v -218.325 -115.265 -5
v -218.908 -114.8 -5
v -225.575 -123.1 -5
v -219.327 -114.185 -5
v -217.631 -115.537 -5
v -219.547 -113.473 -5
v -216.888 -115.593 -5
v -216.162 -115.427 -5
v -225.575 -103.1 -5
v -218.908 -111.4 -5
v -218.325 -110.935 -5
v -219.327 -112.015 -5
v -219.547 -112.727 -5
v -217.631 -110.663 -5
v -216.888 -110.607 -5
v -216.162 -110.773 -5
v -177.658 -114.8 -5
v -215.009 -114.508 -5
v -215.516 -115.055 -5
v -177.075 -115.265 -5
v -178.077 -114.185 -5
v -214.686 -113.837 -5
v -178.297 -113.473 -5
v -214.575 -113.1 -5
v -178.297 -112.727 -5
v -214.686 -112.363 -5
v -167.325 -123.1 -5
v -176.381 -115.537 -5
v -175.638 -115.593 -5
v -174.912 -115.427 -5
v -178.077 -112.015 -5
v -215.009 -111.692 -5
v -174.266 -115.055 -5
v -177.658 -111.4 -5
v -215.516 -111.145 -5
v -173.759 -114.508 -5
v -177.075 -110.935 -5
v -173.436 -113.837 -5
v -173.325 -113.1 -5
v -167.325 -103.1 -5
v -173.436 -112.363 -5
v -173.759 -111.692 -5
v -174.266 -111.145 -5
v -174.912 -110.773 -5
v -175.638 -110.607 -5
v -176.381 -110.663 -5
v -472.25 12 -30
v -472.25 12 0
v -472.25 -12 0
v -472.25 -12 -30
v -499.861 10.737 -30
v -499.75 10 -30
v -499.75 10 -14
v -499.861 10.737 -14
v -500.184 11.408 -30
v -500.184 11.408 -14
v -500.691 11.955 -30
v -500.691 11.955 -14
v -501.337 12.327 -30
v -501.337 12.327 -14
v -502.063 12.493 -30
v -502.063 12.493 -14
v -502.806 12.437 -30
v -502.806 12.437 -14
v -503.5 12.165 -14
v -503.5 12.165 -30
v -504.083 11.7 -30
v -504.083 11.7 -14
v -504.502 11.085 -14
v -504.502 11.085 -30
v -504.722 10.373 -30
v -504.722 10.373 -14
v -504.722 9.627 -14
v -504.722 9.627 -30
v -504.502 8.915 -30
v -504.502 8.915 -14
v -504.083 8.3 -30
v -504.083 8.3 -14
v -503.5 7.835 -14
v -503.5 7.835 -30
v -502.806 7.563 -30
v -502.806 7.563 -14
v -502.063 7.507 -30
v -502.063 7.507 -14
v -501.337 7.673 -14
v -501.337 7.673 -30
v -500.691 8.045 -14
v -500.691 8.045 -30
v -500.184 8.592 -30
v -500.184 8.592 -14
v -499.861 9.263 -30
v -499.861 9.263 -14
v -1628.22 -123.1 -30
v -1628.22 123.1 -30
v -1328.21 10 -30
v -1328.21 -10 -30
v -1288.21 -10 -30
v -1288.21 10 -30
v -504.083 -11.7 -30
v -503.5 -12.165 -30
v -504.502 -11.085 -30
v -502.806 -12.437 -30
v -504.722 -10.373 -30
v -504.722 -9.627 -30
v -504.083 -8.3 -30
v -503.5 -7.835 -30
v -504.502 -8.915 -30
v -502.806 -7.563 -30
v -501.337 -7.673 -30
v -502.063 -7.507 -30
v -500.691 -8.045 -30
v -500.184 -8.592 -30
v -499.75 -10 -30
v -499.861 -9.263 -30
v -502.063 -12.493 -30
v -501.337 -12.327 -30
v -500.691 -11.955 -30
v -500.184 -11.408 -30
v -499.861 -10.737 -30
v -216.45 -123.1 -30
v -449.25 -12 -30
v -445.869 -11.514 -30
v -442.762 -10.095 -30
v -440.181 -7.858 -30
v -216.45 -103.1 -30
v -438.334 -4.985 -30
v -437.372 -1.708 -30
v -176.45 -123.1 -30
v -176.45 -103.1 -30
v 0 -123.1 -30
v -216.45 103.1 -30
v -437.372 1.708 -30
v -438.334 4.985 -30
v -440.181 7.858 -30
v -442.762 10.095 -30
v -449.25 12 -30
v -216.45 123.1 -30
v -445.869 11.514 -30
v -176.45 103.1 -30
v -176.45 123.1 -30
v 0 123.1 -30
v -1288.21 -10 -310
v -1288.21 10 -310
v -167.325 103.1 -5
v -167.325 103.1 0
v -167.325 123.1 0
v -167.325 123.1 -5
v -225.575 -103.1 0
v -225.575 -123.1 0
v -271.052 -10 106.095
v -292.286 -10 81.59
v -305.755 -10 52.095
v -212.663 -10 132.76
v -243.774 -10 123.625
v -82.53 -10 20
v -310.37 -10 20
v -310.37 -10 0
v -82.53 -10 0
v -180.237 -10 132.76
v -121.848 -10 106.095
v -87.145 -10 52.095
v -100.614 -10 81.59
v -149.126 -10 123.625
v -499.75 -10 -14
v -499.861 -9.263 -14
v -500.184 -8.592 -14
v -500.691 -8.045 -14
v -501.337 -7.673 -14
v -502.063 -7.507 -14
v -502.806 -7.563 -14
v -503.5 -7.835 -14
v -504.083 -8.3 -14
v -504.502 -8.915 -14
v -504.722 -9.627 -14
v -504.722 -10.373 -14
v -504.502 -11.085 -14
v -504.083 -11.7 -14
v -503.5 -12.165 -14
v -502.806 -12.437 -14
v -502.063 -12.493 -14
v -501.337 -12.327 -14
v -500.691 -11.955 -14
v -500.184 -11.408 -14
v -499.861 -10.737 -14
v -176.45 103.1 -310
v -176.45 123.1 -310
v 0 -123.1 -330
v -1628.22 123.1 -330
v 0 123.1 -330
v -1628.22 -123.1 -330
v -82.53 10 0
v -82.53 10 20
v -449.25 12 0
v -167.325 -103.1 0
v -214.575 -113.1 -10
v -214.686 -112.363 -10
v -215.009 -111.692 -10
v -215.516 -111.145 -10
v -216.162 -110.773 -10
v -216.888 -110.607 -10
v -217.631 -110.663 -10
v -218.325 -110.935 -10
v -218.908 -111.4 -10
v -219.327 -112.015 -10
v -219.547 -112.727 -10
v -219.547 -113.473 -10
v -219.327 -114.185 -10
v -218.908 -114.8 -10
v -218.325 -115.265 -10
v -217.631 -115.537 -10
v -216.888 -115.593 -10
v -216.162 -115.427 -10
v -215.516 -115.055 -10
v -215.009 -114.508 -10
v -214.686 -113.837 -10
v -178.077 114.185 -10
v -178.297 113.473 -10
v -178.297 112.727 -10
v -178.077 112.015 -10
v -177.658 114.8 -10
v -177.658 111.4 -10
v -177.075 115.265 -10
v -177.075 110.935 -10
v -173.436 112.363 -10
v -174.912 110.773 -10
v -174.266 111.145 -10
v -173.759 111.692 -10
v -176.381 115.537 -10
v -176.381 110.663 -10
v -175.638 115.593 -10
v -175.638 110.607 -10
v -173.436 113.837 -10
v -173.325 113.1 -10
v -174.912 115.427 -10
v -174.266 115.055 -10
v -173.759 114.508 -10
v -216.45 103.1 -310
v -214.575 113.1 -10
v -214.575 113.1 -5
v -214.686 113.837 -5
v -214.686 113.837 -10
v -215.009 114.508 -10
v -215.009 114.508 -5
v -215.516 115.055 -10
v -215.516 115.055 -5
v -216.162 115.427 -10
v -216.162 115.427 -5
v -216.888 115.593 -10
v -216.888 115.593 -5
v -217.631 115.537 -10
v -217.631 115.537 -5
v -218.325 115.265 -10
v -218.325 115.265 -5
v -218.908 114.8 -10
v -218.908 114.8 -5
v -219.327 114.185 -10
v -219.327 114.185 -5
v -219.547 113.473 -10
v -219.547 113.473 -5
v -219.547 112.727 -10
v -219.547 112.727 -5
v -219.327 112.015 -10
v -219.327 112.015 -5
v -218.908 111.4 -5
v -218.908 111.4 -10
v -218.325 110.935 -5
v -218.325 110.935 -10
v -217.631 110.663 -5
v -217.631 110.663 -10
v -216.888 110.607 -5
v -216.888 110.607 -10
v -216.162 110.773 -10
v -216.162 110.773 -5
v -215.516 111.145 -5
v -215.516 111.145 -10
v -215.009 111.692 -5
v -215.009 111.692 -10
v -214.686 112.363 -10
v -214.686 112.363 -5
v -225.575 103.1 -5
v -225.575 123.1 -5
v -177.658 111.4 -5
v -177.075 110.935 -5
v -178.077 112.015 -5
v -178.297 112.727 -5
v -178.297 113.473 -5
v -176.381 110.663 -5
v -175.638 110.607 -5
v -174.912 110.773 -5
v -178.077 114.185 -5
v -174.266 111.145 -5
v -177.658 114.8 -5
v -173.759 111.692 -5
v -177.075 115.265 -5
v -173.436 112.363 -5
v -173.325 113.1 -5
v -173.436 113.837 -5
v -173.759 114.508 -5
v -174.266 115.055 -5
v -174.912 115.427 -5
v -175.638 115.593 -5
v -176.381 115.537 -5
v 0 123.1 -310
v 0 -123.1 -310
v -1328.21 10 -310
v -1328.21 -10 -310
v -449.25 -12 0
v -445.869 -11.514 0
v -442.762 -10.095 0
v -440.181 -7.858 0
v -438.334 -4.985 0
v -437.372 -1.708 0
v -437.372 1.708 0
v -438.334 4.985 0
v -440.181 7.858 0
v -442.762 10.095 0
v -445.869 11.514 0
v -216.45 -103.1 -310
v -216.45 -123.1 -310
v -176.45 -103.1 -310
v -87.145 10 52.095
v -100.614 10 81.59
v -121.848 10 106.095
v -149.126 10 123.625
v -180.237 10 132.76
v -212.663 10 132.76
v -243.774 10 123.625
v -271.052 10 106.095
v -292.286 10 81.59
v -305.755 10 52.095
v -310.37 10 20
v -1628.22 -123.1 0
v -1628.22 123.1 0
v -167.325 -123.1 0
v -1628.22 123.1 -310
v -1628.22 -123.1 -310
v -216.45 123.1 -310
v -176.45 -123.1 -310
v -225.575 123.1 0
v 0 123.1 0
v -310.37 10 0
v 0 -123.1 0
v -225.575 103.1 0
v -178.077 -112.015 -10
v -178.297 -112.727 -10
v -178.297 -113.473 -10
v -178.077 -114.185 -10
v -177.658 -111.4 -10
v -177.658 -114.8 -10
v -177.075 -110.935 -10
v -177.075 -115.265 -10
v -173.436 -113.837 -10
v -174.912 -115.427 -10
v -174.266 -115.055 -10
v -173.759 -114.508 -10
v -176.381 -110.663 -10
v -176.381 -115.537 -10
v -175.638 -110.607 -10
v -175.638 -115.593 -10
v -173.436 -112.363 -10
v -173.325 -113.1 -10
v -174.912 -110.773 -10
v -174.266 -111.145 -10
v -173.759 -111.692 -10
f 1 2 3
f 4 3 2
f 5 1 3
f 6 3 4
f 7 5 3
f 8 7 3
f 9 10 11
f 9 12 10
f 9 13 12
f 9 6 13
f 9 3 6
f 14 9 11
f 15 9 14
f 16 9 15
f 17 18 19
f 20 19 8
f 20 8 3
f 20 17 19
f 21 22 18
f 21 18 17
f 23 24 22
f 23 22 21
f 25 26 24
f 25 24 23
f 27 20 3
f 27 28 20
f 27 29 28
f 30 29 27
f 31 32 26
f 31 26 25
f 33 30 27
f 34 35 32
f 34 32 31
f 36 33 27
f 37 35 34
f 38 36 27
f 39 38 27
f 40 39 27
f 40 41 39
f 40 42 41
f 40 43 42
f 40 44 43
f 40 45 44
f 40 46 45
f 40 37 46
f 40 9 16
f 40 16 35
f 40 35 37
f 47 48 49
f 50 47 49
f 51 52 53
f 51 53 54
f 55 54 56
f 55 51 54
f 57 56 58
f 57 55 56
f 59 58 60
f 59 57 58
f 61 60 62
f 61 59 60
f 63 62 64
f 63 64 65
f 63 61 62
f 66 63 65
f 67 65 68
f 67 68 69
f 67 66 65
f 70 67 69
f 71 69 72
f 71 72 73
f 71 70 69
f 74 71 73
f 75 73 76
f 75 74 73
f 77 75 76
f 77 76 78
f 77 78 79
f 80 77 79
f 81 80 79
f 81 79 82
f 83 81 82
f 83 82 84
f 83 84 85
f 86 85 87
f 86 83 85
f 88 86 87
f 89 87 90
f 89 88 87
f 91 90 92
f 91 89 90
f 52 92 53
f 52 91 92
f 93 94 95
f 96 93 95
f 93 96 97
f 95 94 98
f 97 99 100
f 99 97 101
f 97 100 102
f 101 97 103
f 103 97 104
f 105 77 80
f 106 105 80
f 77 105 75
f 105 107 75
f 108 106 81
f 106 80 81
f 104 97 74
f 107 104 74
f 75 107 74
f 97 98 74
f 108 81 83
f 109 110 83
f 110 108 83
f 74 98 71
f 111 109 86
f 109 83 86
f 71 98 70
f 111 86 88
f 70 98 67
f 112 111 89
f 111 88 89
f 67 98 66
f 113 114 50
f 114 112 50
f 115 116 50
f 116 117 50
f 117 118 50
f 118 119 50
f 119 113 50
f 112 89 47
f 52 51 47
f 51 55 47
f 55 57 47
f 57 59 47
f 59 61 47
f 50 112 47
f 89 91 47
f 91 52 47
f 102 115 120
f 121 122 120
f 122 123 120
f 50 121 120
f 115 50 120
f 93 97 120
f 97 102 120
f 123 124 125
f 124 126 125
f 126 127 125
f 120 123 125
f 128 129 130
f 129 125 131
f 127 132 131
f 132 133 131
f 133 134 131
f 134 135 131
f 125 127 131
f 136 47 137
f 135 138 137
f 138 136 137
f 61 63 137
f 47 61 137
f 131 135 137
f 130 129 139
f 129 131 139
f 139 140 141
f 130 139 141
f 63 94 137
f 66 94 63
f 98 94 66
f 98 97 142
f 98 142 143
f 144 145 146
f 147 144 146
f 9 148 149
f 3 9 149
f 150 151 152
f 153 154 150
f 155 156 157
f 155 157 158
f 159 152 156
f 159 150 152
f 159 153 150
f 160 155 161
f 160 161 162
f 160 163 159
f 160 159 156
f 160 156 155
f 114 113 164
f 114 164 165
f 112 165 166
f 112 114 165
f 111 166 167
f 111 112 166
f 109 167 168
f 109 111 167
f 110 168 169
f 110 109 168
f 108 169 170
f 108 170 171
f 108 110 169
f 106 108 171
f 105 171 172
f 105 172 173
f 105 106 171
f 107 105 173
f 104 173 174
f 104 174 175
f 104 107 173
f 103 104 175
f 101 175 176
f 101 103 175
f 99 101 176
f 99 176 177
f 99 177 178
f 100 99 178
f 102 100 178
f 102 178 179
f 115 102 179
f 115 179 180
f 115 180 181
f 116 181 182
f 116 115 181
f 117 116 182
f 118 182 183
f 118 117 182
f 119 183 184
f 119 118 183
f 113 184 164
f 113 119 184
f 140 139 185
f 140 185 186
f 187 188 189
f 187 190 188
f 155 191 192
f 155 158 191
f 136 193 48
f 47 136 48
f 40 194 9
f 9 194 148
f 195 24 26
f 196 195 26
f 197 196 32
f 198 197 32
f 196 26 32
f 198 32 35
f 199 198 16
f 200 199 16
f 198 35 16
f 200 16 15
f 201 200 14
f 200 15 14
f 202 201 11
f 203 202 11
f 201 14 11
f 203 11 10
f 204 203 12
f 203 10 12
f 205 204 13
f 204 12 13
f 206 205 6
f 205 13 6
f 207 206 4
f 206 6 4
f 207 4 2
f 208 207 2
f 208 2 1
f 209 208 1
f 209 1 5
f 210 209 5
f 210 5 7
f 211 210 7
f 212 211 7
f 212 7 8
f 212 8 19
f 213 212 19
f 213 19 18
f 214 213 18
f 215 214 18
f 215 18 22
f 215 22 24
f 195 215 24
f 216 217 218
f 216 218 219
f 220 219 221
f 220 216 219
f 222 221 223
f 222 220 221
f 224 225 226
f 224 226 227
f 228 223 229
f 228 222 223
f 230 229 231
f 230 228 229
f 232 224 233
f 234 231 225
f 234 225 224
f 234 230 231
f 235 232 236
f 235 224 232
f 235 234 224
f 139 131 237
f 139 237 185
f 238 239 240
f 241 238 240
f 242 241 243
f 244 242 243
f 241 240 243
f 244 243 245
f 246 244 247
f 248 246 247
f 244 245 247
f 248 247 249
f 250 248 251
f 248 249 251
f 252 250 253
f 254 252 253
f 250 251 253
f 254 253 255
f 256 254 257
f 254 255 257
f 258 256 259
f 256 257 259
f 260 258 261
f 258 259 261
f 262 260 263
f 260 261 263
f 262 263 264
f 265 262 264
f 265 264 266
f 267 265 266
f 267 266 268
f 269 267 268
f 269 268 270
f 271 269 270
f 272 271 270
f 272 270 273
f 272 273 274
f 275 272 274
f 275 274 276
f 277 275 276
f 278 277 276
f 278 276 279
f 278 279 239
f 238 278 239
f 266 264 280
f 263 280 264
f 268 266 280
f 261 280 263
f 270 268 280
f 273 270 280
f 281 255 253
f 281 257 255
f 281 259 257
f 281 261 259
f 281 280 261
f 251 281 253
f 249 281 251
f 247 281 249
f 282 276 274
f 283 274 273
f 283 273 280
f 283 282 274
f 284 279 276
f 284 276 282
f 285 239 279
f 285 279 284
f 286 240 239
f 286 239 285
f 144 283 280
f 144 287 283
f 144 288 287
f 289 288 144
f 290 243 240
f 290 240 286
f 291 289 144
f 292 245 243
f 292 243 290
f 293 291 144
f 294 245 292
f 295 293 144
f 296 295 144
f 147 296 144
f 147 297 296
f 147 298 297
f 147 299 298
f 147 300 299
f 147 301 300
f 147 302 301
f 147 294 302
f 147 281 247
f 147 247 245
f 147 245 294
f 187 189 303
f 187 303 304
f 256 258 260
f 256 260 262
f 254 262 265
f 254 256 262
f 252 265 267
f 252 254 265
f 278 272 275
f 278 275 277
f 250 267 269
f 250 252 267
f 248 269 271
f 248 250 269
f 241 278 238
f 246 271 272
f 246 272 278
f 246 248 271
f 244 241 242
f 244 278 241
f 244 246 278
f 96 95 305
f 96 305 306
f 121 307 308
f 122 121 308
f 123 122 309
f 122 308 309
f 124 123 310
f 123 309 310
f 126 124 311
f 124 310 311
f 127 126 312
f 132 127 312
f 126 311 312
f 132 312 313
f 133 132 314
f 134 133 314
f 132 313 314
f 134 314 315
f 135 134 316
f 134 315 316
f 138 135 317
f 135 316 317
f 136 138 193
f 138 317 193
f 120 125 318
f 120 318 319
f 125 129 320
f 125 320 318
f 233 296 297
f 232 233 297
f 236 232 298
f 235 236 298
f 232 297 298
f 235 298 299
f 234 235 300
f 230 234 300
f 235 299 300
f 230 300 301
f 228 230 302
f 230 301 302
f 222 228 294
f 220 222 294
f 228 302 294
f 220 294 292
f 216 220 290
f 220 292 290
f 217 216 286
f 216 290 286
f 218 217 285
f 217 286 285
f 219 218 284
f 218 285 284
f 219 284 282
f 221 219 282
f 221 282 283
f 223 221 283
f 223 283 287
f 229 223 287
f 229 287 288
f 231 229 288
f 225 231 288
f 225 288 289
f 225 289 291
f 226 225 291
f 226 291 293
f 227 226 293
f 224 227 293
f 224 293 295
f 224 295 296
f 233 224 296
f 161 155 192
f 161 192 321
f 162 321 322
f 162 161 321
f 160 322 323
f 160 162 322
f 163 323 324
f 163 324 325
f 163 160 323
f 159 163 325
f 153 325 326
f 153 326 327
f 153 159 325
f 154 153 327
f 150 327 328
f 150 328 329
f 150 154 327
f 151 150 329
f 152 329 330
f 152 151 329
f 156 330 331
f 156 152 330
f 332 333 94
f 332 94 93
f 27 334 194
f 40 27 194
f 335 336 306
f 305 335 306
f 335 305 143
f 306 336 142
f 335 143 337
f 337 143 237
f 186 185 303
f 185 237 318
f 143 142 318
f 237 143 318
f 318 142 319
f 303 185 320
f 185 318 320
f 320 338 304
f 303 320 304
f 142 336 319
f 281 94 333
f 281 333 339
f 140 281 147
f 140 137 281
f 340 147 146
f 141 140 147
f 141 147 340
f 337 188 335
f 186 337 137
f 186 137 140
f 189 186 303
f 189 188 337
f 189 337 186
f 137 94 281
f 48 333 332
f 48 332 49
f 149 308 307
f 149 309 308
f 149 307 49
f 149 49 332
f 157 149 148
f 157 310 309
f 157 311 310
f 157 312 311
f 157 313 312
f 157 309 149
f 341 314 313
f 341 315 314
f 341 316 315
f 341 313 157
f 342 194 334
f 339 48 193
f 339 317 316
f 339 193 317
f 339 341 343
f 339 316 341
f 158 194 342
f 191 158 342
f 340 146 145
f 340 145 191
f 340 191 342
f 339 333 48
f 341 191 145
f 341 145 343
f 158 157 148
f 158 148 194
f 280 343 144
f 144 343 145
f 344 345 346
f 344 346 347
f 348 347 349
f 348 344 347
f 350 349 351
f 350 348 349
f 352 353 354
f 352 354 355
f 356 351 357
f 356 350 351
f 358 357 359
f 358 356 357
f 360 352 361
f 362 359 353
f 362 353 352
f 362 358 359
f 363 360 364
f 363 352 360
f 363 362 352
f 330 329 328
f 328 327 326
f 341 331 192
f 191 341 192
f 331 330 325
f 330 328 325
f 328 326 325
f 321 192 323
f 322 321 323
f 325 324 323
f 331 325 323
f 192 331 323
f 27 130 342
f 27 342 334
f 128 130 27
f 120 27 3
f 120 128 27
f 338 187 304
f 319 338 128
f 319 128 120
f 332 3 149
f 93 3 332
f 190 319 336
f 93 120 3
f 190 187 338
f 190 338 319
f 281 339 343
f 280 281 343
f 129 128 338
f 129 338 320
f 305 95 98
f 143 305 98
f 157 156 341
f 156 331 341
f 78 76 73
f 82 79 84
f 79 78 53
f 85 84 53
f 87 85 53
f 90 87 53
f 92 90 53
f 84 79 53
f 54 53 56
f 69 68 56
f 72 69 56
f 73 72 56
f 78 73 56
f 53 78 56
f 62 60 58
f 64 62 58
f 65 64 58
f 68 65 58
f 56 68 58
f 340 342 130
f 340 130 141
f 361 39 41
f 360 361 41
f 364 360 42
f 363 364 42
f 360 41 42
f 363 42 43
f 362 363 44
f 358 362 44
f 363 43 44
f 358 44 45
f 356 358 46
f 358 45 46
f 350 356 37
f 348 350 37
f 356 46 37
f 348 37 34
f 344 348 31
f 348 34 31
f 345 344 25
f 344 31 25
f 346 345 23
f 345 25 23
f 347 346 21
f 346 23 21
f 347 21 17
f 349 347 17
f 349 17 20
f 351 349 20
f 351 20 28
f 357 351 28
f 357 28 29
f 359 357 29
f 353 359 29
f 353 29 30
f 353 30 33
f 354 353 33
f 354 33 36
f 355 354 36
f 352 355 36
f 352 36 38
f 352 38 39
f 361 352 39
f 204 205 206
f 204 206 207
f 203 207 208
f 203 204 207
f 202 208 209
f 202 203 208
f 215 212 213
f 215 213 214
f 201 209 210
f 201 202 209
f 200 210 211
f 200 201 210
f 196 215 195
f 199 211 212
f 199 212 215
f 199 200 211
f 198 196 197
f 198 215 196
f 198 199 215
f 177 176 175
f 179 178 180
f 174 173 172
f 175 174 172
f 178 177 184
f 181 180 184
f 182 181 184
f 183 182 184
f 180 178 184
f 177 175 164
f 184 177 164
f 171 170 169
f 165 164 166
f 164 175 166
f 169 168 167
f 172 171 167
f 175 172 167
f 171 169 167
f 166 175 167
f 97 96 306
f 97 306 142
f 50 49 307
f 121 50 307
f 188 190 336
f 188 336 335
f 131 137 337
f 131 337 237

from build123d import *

# Parameters (mm, degrees)
F1_DEPTH      = 30
F3_DEPTH      = 10
F3_DEPTH_BACK = 10
F5_DEPTH      = 30.001
F6_R          = 2.5
F7_DEPTH      = 5
F8_DEPTH      = 10
F10_R         = 2.5
F11_DEPTH     = 16
F12_W         = 40
F12_H         = 10
F13_DEPTH     = 300
F16_DEPTH     = 20


with BuildPart() as f1:
    # F0 (on Top) → F1 (new body)
    with BuildSketch(Plane.XY):
        Polygon((0, -123.1), (0, 0), (0, 123.1), (-1628.22, 123.1), (-1628.22, -123.1), align=None)
    extrude(amount=-F1_DEPTH)

    # F2 (on Front) → F3 (join, two sides)
    with BuildSketch(Plane.XZ) as f3_sk:
        with BuildLine():
            Line((-196.45, 0), (-82.53, 0))
            Line((-82.53, 0), (-82.53, 20))
            ThreePointArc((-82.53, 20), (-196.45, 133.92), (-310.37, 20))
            Line((-310.37, 20), (-310.37, 0))
            Line((-310.37, 0), (-196.45, 0))
        make_face()
    extrude(amount=F3_DEPTH)
    extrude(f3_sk.sketch, amount=-F3_DEPTH_BACK)

    # F4 (on Top) → F5 (cut, through all)
    with BuildSketch(Plane.XY):
        with BuildLine():
            Line((-449.25, 12), (-460.75, 12))
            Line((-460.75, 12), (-472.25, 12))
            Line((-472.25, 12), (-472.25, -12))
            Line((-472.25, -12), (-449.25, -12))
            ThreePointArc((-449.25, -12), (-437.25, 0), (-449.25, 12))
        make_face()
    extrude(amount=-F5_DEPTH, mode=Mode.SUBTRACT)

    # F6 (on Top) → F7 (cut)
    with BuildSketch(Plane.XY):
        Polygon((-167.325, 123.1), (-196.45, 123.1), (-225.575, 123.1), (-225.575, 103.1), (-167.325, 103.1), align=None)
        with Locations((-217.075, 113.1)):
            Circle(F6_R, mode=Mode.SUBTRACT)
        with Locations((-175.825, 113.1)):
            Circle(F6_R, mode=Mode.SUBTRACT)
        Polygon((-167.325, -123.1), (-167.325, -103.1), (-225.575, -103.1), (-225.575, -123.1), (-196.45, -123.1), align=None)
        with Locations((-217.075, -113.1)):
            Circle(F6_R, mode=Mode.SUBTRACT)
        with Locations((-175.825, -113.1)):
            Circle(F6_R, mode=Mode.SUBTRACT)
    extrude(amount=-F7_DEPTH, mode=Mode.SUBTRACT)

    # F8 (cut): faces of the model
    f8_faces = [f1.faces().sort_by_distance(p)[0] for p in [
        (-175.825, 113.1, 0),
        (-217.075, 113.1, 0),
        (-175.825, -113.1, 0),
        (-217.075, -113.1, 0),
    ]]
    extrude(f8_faces, amount=-F8_DEPTH, mode=Mode.SUBTRACT)

    # F10 (on offset) → F11 (cut)
    with BuildSketch(Plane.XY.offset(-30)):
        with Locations((-502.25, -10)):
            Circle(F10_R)
        with Locations((-502.25, 10)):
            Circle(F10_R)
    extrude(amount=F11_DEPTH, mode=Mode.SUBTRACT)

    # F12 (on offset) → F13 (join)
    with BuildSketch(Plane.XY.offset(-30)):
        Polygon((-216.45, -123.1), (-196.45, -123.1), (-176.45, -123.1), (-176.45, -103.1), (-216.45, -103.1), align=None)
        Polygon((-216.45, 103.1), (-176.45, 103.1), (-176.45, 123.1), (-196.45, 123.1), (-216.45, 123.1), align=None)
        with Locations((-1308.21, 5)):
            Rectangle(F12_W, F12_H)
        with Locations((-1308.21, -5)):
            Rectangle(F12_W, F12_H)
    extrude(amount=-F13_DEPTH)

    # F15 (on offset) → F16 (join)
    with BuildSketch(Plane(origin=(0, 0, -330), x_dir=(1, 0, 0), z_dir=(0, 0, -1))):
        Polygon((0, -123.1), (0, 0), (0, 123.1), (-1628.22, 123.1), (-1628.22, -123.1), align=None)
    extrude(amount=-F16_DEPTH)


solid = f1.part
